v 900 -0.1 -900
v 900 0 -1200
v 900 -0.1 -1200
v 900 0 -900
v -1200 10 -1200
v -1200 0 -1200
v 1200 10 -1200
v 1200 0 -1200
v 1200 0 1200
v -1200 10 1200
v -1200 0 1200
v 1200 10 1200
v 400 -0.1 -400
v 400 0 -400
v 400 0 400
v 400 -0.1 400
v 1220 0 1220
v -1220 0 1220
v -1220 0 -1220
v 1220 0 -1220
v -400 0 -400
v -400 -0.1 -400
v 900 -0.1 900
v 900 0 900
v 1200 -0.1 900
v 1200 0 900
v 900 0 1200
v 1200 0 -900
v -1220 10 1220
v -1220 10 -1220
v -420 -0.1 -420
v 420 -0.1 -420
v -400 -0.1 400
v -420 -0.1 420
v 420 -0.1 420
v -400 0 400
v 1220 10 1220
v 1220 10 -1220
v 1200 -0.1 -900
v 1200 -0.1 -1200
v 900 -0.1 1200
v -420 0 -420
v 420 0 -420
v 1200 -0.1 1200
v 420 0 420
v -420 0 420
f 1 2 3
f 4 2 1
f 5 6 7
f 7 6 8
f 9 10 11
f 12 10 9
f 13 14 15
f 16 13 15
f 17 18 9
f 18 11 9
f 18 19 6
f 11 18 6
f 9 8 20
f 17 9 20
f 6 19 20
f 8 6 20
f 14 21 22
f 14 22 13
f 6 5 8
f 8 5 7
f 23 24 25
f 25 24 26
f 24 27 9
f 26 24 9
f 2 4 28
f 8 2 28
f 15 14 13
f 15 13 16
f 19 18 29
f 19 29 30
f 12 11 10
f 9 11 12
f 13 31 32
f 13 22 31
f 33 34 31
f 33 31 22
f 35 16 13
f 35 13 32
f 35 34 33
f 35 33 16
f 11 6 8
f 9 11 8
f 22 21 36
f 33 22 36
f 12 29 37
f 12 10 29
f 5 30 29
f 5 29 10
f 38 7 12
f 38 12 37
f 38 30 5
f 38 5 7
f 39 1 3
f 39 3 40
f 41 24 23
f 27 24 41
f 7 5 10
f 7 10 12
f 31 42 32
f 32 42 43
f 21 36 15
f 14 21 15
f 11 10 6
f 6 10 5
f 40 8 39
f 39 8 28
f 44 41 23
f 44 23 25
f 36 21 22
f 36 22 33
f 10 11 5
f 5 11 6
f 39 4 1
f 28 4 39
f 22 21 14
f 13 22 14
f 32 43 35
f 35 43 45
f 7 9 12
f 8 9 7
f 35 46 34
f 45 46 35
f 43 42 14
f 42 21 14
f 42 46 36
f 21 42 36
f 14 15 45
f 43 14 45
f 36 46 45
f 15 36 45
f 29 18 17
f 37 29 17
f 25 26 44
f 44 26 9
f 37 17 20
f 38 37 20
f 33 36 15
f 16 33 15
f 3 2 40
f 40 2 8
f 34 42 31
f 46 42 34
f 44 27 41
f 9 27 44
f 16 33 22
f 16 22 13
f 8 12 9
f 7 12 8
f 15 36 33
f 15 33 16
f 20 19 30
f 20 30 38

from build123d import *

# Parameters (mm, degrees)
SKETCH_4_W       = 2440
SKETCH_4_H       = 2440
SKETCH_4_W_2     = 2400
SKETCH_4_H_2     = 2400
EXTRUDE_4_DEPTH  = 10
SKETCH_5_W       = 2400
SKETCH_5_H       = 2400
EXTRUDE_6_DEPTH  = 10
SKETCH_6_W       = 300
SKETCH_6_H       = 300
EXTRUDE_9_DEPTH  = 0.1
SKETCH_7_W       = 300
SKETCH_7_H       = 300
EXTRUDE_10_DEPTH = 0.1
SKETCH_8_W       = 800
SKETCH_8_H       = 800
EXTRUDE_11_DEPTH = 0.1
SKETCH_9_W       = 840
SKETCH_9_H       = 840
SKETCH_9_W_2     = 800
SKETCH_9_H_2     = 800
EXTRUDE_13_DEPTH = 0.1


with BuildPart() as part:
    # 草图4 → 凸台-拉伸4 (new body)
    with BuildSketch(Plane(origin=(0, 0, 0), x_dir=(1, 0, 0), z_dir=(0, 1, 0))):
        Rectangle(SKETCH_4_W, SKETCH_4_H)
        Rectangle(SKETCH_4_W_2, SKETCH_4_H_2, mode=Mode.SUBTRACT)
    extrude(amount=EXTRUDE_4_DEPTH)


with BuildPart() as body_2:
    # 草图5 → 凸台-拉伸6 (new body)
    with BuildSketch(Plane(origin=(0, 10, 0), x_dir=(1, 0, 0), z_dir=(0, 1, 0))):
        Rectangle(SKETCH_5_W, SKETCH_5_H)
    extrude(amount=-EXTRUDE_6_DEPTH)


with BuildPart() as body_3:
    # 草图6 → 凸台-拉伸9 (new body)
    with BuildSketch(Plane.XZ):
        with Locations((1050, 1050)):
            Rectangle(SKETCH_6_W, SKETCH_6_H)
    extrude(amount=EXTRUDE_9_DEPTH)


with BuildPart() as body_4:
    # 草图7 → 凸台-拉伸10 (new body)
    with BuildSketch(Plane.XZ):
        with Locations((1050, -1050)):
            Rectangle(SKETCH_7_W, SKETCH_7_H)
    extrude(amount=EXTRUDE_10_DEPTH)


with BuildPart() as body_5:
    # 草图8 → 凸台-拉伸11 (new body)
    with BuildSketch(Plane.XZ):
        Rectangle(SKETCH_8_W, SKETCH_8_H)
    extrude(amount=EXTRUDE_11_DEPTH)


with BuildPart() as body_6:
    # 草图9 → 凸台-拉伸13 (new body)
    with BuildSketch(Plane.XZ):
        Rectangle(SKETCH_9_W, SKETCH_9_H)
        Rectangle(SKETCH_9_W_2, SKETCH_9_H_2, mode=Mode.SUBTRACT)
    extrude(amount=EXTRUDE_13_DEPTH)


solid = Compound([part.part, body_2.part, body_3.part, body_4.part, body_5.part, body_6.part])
